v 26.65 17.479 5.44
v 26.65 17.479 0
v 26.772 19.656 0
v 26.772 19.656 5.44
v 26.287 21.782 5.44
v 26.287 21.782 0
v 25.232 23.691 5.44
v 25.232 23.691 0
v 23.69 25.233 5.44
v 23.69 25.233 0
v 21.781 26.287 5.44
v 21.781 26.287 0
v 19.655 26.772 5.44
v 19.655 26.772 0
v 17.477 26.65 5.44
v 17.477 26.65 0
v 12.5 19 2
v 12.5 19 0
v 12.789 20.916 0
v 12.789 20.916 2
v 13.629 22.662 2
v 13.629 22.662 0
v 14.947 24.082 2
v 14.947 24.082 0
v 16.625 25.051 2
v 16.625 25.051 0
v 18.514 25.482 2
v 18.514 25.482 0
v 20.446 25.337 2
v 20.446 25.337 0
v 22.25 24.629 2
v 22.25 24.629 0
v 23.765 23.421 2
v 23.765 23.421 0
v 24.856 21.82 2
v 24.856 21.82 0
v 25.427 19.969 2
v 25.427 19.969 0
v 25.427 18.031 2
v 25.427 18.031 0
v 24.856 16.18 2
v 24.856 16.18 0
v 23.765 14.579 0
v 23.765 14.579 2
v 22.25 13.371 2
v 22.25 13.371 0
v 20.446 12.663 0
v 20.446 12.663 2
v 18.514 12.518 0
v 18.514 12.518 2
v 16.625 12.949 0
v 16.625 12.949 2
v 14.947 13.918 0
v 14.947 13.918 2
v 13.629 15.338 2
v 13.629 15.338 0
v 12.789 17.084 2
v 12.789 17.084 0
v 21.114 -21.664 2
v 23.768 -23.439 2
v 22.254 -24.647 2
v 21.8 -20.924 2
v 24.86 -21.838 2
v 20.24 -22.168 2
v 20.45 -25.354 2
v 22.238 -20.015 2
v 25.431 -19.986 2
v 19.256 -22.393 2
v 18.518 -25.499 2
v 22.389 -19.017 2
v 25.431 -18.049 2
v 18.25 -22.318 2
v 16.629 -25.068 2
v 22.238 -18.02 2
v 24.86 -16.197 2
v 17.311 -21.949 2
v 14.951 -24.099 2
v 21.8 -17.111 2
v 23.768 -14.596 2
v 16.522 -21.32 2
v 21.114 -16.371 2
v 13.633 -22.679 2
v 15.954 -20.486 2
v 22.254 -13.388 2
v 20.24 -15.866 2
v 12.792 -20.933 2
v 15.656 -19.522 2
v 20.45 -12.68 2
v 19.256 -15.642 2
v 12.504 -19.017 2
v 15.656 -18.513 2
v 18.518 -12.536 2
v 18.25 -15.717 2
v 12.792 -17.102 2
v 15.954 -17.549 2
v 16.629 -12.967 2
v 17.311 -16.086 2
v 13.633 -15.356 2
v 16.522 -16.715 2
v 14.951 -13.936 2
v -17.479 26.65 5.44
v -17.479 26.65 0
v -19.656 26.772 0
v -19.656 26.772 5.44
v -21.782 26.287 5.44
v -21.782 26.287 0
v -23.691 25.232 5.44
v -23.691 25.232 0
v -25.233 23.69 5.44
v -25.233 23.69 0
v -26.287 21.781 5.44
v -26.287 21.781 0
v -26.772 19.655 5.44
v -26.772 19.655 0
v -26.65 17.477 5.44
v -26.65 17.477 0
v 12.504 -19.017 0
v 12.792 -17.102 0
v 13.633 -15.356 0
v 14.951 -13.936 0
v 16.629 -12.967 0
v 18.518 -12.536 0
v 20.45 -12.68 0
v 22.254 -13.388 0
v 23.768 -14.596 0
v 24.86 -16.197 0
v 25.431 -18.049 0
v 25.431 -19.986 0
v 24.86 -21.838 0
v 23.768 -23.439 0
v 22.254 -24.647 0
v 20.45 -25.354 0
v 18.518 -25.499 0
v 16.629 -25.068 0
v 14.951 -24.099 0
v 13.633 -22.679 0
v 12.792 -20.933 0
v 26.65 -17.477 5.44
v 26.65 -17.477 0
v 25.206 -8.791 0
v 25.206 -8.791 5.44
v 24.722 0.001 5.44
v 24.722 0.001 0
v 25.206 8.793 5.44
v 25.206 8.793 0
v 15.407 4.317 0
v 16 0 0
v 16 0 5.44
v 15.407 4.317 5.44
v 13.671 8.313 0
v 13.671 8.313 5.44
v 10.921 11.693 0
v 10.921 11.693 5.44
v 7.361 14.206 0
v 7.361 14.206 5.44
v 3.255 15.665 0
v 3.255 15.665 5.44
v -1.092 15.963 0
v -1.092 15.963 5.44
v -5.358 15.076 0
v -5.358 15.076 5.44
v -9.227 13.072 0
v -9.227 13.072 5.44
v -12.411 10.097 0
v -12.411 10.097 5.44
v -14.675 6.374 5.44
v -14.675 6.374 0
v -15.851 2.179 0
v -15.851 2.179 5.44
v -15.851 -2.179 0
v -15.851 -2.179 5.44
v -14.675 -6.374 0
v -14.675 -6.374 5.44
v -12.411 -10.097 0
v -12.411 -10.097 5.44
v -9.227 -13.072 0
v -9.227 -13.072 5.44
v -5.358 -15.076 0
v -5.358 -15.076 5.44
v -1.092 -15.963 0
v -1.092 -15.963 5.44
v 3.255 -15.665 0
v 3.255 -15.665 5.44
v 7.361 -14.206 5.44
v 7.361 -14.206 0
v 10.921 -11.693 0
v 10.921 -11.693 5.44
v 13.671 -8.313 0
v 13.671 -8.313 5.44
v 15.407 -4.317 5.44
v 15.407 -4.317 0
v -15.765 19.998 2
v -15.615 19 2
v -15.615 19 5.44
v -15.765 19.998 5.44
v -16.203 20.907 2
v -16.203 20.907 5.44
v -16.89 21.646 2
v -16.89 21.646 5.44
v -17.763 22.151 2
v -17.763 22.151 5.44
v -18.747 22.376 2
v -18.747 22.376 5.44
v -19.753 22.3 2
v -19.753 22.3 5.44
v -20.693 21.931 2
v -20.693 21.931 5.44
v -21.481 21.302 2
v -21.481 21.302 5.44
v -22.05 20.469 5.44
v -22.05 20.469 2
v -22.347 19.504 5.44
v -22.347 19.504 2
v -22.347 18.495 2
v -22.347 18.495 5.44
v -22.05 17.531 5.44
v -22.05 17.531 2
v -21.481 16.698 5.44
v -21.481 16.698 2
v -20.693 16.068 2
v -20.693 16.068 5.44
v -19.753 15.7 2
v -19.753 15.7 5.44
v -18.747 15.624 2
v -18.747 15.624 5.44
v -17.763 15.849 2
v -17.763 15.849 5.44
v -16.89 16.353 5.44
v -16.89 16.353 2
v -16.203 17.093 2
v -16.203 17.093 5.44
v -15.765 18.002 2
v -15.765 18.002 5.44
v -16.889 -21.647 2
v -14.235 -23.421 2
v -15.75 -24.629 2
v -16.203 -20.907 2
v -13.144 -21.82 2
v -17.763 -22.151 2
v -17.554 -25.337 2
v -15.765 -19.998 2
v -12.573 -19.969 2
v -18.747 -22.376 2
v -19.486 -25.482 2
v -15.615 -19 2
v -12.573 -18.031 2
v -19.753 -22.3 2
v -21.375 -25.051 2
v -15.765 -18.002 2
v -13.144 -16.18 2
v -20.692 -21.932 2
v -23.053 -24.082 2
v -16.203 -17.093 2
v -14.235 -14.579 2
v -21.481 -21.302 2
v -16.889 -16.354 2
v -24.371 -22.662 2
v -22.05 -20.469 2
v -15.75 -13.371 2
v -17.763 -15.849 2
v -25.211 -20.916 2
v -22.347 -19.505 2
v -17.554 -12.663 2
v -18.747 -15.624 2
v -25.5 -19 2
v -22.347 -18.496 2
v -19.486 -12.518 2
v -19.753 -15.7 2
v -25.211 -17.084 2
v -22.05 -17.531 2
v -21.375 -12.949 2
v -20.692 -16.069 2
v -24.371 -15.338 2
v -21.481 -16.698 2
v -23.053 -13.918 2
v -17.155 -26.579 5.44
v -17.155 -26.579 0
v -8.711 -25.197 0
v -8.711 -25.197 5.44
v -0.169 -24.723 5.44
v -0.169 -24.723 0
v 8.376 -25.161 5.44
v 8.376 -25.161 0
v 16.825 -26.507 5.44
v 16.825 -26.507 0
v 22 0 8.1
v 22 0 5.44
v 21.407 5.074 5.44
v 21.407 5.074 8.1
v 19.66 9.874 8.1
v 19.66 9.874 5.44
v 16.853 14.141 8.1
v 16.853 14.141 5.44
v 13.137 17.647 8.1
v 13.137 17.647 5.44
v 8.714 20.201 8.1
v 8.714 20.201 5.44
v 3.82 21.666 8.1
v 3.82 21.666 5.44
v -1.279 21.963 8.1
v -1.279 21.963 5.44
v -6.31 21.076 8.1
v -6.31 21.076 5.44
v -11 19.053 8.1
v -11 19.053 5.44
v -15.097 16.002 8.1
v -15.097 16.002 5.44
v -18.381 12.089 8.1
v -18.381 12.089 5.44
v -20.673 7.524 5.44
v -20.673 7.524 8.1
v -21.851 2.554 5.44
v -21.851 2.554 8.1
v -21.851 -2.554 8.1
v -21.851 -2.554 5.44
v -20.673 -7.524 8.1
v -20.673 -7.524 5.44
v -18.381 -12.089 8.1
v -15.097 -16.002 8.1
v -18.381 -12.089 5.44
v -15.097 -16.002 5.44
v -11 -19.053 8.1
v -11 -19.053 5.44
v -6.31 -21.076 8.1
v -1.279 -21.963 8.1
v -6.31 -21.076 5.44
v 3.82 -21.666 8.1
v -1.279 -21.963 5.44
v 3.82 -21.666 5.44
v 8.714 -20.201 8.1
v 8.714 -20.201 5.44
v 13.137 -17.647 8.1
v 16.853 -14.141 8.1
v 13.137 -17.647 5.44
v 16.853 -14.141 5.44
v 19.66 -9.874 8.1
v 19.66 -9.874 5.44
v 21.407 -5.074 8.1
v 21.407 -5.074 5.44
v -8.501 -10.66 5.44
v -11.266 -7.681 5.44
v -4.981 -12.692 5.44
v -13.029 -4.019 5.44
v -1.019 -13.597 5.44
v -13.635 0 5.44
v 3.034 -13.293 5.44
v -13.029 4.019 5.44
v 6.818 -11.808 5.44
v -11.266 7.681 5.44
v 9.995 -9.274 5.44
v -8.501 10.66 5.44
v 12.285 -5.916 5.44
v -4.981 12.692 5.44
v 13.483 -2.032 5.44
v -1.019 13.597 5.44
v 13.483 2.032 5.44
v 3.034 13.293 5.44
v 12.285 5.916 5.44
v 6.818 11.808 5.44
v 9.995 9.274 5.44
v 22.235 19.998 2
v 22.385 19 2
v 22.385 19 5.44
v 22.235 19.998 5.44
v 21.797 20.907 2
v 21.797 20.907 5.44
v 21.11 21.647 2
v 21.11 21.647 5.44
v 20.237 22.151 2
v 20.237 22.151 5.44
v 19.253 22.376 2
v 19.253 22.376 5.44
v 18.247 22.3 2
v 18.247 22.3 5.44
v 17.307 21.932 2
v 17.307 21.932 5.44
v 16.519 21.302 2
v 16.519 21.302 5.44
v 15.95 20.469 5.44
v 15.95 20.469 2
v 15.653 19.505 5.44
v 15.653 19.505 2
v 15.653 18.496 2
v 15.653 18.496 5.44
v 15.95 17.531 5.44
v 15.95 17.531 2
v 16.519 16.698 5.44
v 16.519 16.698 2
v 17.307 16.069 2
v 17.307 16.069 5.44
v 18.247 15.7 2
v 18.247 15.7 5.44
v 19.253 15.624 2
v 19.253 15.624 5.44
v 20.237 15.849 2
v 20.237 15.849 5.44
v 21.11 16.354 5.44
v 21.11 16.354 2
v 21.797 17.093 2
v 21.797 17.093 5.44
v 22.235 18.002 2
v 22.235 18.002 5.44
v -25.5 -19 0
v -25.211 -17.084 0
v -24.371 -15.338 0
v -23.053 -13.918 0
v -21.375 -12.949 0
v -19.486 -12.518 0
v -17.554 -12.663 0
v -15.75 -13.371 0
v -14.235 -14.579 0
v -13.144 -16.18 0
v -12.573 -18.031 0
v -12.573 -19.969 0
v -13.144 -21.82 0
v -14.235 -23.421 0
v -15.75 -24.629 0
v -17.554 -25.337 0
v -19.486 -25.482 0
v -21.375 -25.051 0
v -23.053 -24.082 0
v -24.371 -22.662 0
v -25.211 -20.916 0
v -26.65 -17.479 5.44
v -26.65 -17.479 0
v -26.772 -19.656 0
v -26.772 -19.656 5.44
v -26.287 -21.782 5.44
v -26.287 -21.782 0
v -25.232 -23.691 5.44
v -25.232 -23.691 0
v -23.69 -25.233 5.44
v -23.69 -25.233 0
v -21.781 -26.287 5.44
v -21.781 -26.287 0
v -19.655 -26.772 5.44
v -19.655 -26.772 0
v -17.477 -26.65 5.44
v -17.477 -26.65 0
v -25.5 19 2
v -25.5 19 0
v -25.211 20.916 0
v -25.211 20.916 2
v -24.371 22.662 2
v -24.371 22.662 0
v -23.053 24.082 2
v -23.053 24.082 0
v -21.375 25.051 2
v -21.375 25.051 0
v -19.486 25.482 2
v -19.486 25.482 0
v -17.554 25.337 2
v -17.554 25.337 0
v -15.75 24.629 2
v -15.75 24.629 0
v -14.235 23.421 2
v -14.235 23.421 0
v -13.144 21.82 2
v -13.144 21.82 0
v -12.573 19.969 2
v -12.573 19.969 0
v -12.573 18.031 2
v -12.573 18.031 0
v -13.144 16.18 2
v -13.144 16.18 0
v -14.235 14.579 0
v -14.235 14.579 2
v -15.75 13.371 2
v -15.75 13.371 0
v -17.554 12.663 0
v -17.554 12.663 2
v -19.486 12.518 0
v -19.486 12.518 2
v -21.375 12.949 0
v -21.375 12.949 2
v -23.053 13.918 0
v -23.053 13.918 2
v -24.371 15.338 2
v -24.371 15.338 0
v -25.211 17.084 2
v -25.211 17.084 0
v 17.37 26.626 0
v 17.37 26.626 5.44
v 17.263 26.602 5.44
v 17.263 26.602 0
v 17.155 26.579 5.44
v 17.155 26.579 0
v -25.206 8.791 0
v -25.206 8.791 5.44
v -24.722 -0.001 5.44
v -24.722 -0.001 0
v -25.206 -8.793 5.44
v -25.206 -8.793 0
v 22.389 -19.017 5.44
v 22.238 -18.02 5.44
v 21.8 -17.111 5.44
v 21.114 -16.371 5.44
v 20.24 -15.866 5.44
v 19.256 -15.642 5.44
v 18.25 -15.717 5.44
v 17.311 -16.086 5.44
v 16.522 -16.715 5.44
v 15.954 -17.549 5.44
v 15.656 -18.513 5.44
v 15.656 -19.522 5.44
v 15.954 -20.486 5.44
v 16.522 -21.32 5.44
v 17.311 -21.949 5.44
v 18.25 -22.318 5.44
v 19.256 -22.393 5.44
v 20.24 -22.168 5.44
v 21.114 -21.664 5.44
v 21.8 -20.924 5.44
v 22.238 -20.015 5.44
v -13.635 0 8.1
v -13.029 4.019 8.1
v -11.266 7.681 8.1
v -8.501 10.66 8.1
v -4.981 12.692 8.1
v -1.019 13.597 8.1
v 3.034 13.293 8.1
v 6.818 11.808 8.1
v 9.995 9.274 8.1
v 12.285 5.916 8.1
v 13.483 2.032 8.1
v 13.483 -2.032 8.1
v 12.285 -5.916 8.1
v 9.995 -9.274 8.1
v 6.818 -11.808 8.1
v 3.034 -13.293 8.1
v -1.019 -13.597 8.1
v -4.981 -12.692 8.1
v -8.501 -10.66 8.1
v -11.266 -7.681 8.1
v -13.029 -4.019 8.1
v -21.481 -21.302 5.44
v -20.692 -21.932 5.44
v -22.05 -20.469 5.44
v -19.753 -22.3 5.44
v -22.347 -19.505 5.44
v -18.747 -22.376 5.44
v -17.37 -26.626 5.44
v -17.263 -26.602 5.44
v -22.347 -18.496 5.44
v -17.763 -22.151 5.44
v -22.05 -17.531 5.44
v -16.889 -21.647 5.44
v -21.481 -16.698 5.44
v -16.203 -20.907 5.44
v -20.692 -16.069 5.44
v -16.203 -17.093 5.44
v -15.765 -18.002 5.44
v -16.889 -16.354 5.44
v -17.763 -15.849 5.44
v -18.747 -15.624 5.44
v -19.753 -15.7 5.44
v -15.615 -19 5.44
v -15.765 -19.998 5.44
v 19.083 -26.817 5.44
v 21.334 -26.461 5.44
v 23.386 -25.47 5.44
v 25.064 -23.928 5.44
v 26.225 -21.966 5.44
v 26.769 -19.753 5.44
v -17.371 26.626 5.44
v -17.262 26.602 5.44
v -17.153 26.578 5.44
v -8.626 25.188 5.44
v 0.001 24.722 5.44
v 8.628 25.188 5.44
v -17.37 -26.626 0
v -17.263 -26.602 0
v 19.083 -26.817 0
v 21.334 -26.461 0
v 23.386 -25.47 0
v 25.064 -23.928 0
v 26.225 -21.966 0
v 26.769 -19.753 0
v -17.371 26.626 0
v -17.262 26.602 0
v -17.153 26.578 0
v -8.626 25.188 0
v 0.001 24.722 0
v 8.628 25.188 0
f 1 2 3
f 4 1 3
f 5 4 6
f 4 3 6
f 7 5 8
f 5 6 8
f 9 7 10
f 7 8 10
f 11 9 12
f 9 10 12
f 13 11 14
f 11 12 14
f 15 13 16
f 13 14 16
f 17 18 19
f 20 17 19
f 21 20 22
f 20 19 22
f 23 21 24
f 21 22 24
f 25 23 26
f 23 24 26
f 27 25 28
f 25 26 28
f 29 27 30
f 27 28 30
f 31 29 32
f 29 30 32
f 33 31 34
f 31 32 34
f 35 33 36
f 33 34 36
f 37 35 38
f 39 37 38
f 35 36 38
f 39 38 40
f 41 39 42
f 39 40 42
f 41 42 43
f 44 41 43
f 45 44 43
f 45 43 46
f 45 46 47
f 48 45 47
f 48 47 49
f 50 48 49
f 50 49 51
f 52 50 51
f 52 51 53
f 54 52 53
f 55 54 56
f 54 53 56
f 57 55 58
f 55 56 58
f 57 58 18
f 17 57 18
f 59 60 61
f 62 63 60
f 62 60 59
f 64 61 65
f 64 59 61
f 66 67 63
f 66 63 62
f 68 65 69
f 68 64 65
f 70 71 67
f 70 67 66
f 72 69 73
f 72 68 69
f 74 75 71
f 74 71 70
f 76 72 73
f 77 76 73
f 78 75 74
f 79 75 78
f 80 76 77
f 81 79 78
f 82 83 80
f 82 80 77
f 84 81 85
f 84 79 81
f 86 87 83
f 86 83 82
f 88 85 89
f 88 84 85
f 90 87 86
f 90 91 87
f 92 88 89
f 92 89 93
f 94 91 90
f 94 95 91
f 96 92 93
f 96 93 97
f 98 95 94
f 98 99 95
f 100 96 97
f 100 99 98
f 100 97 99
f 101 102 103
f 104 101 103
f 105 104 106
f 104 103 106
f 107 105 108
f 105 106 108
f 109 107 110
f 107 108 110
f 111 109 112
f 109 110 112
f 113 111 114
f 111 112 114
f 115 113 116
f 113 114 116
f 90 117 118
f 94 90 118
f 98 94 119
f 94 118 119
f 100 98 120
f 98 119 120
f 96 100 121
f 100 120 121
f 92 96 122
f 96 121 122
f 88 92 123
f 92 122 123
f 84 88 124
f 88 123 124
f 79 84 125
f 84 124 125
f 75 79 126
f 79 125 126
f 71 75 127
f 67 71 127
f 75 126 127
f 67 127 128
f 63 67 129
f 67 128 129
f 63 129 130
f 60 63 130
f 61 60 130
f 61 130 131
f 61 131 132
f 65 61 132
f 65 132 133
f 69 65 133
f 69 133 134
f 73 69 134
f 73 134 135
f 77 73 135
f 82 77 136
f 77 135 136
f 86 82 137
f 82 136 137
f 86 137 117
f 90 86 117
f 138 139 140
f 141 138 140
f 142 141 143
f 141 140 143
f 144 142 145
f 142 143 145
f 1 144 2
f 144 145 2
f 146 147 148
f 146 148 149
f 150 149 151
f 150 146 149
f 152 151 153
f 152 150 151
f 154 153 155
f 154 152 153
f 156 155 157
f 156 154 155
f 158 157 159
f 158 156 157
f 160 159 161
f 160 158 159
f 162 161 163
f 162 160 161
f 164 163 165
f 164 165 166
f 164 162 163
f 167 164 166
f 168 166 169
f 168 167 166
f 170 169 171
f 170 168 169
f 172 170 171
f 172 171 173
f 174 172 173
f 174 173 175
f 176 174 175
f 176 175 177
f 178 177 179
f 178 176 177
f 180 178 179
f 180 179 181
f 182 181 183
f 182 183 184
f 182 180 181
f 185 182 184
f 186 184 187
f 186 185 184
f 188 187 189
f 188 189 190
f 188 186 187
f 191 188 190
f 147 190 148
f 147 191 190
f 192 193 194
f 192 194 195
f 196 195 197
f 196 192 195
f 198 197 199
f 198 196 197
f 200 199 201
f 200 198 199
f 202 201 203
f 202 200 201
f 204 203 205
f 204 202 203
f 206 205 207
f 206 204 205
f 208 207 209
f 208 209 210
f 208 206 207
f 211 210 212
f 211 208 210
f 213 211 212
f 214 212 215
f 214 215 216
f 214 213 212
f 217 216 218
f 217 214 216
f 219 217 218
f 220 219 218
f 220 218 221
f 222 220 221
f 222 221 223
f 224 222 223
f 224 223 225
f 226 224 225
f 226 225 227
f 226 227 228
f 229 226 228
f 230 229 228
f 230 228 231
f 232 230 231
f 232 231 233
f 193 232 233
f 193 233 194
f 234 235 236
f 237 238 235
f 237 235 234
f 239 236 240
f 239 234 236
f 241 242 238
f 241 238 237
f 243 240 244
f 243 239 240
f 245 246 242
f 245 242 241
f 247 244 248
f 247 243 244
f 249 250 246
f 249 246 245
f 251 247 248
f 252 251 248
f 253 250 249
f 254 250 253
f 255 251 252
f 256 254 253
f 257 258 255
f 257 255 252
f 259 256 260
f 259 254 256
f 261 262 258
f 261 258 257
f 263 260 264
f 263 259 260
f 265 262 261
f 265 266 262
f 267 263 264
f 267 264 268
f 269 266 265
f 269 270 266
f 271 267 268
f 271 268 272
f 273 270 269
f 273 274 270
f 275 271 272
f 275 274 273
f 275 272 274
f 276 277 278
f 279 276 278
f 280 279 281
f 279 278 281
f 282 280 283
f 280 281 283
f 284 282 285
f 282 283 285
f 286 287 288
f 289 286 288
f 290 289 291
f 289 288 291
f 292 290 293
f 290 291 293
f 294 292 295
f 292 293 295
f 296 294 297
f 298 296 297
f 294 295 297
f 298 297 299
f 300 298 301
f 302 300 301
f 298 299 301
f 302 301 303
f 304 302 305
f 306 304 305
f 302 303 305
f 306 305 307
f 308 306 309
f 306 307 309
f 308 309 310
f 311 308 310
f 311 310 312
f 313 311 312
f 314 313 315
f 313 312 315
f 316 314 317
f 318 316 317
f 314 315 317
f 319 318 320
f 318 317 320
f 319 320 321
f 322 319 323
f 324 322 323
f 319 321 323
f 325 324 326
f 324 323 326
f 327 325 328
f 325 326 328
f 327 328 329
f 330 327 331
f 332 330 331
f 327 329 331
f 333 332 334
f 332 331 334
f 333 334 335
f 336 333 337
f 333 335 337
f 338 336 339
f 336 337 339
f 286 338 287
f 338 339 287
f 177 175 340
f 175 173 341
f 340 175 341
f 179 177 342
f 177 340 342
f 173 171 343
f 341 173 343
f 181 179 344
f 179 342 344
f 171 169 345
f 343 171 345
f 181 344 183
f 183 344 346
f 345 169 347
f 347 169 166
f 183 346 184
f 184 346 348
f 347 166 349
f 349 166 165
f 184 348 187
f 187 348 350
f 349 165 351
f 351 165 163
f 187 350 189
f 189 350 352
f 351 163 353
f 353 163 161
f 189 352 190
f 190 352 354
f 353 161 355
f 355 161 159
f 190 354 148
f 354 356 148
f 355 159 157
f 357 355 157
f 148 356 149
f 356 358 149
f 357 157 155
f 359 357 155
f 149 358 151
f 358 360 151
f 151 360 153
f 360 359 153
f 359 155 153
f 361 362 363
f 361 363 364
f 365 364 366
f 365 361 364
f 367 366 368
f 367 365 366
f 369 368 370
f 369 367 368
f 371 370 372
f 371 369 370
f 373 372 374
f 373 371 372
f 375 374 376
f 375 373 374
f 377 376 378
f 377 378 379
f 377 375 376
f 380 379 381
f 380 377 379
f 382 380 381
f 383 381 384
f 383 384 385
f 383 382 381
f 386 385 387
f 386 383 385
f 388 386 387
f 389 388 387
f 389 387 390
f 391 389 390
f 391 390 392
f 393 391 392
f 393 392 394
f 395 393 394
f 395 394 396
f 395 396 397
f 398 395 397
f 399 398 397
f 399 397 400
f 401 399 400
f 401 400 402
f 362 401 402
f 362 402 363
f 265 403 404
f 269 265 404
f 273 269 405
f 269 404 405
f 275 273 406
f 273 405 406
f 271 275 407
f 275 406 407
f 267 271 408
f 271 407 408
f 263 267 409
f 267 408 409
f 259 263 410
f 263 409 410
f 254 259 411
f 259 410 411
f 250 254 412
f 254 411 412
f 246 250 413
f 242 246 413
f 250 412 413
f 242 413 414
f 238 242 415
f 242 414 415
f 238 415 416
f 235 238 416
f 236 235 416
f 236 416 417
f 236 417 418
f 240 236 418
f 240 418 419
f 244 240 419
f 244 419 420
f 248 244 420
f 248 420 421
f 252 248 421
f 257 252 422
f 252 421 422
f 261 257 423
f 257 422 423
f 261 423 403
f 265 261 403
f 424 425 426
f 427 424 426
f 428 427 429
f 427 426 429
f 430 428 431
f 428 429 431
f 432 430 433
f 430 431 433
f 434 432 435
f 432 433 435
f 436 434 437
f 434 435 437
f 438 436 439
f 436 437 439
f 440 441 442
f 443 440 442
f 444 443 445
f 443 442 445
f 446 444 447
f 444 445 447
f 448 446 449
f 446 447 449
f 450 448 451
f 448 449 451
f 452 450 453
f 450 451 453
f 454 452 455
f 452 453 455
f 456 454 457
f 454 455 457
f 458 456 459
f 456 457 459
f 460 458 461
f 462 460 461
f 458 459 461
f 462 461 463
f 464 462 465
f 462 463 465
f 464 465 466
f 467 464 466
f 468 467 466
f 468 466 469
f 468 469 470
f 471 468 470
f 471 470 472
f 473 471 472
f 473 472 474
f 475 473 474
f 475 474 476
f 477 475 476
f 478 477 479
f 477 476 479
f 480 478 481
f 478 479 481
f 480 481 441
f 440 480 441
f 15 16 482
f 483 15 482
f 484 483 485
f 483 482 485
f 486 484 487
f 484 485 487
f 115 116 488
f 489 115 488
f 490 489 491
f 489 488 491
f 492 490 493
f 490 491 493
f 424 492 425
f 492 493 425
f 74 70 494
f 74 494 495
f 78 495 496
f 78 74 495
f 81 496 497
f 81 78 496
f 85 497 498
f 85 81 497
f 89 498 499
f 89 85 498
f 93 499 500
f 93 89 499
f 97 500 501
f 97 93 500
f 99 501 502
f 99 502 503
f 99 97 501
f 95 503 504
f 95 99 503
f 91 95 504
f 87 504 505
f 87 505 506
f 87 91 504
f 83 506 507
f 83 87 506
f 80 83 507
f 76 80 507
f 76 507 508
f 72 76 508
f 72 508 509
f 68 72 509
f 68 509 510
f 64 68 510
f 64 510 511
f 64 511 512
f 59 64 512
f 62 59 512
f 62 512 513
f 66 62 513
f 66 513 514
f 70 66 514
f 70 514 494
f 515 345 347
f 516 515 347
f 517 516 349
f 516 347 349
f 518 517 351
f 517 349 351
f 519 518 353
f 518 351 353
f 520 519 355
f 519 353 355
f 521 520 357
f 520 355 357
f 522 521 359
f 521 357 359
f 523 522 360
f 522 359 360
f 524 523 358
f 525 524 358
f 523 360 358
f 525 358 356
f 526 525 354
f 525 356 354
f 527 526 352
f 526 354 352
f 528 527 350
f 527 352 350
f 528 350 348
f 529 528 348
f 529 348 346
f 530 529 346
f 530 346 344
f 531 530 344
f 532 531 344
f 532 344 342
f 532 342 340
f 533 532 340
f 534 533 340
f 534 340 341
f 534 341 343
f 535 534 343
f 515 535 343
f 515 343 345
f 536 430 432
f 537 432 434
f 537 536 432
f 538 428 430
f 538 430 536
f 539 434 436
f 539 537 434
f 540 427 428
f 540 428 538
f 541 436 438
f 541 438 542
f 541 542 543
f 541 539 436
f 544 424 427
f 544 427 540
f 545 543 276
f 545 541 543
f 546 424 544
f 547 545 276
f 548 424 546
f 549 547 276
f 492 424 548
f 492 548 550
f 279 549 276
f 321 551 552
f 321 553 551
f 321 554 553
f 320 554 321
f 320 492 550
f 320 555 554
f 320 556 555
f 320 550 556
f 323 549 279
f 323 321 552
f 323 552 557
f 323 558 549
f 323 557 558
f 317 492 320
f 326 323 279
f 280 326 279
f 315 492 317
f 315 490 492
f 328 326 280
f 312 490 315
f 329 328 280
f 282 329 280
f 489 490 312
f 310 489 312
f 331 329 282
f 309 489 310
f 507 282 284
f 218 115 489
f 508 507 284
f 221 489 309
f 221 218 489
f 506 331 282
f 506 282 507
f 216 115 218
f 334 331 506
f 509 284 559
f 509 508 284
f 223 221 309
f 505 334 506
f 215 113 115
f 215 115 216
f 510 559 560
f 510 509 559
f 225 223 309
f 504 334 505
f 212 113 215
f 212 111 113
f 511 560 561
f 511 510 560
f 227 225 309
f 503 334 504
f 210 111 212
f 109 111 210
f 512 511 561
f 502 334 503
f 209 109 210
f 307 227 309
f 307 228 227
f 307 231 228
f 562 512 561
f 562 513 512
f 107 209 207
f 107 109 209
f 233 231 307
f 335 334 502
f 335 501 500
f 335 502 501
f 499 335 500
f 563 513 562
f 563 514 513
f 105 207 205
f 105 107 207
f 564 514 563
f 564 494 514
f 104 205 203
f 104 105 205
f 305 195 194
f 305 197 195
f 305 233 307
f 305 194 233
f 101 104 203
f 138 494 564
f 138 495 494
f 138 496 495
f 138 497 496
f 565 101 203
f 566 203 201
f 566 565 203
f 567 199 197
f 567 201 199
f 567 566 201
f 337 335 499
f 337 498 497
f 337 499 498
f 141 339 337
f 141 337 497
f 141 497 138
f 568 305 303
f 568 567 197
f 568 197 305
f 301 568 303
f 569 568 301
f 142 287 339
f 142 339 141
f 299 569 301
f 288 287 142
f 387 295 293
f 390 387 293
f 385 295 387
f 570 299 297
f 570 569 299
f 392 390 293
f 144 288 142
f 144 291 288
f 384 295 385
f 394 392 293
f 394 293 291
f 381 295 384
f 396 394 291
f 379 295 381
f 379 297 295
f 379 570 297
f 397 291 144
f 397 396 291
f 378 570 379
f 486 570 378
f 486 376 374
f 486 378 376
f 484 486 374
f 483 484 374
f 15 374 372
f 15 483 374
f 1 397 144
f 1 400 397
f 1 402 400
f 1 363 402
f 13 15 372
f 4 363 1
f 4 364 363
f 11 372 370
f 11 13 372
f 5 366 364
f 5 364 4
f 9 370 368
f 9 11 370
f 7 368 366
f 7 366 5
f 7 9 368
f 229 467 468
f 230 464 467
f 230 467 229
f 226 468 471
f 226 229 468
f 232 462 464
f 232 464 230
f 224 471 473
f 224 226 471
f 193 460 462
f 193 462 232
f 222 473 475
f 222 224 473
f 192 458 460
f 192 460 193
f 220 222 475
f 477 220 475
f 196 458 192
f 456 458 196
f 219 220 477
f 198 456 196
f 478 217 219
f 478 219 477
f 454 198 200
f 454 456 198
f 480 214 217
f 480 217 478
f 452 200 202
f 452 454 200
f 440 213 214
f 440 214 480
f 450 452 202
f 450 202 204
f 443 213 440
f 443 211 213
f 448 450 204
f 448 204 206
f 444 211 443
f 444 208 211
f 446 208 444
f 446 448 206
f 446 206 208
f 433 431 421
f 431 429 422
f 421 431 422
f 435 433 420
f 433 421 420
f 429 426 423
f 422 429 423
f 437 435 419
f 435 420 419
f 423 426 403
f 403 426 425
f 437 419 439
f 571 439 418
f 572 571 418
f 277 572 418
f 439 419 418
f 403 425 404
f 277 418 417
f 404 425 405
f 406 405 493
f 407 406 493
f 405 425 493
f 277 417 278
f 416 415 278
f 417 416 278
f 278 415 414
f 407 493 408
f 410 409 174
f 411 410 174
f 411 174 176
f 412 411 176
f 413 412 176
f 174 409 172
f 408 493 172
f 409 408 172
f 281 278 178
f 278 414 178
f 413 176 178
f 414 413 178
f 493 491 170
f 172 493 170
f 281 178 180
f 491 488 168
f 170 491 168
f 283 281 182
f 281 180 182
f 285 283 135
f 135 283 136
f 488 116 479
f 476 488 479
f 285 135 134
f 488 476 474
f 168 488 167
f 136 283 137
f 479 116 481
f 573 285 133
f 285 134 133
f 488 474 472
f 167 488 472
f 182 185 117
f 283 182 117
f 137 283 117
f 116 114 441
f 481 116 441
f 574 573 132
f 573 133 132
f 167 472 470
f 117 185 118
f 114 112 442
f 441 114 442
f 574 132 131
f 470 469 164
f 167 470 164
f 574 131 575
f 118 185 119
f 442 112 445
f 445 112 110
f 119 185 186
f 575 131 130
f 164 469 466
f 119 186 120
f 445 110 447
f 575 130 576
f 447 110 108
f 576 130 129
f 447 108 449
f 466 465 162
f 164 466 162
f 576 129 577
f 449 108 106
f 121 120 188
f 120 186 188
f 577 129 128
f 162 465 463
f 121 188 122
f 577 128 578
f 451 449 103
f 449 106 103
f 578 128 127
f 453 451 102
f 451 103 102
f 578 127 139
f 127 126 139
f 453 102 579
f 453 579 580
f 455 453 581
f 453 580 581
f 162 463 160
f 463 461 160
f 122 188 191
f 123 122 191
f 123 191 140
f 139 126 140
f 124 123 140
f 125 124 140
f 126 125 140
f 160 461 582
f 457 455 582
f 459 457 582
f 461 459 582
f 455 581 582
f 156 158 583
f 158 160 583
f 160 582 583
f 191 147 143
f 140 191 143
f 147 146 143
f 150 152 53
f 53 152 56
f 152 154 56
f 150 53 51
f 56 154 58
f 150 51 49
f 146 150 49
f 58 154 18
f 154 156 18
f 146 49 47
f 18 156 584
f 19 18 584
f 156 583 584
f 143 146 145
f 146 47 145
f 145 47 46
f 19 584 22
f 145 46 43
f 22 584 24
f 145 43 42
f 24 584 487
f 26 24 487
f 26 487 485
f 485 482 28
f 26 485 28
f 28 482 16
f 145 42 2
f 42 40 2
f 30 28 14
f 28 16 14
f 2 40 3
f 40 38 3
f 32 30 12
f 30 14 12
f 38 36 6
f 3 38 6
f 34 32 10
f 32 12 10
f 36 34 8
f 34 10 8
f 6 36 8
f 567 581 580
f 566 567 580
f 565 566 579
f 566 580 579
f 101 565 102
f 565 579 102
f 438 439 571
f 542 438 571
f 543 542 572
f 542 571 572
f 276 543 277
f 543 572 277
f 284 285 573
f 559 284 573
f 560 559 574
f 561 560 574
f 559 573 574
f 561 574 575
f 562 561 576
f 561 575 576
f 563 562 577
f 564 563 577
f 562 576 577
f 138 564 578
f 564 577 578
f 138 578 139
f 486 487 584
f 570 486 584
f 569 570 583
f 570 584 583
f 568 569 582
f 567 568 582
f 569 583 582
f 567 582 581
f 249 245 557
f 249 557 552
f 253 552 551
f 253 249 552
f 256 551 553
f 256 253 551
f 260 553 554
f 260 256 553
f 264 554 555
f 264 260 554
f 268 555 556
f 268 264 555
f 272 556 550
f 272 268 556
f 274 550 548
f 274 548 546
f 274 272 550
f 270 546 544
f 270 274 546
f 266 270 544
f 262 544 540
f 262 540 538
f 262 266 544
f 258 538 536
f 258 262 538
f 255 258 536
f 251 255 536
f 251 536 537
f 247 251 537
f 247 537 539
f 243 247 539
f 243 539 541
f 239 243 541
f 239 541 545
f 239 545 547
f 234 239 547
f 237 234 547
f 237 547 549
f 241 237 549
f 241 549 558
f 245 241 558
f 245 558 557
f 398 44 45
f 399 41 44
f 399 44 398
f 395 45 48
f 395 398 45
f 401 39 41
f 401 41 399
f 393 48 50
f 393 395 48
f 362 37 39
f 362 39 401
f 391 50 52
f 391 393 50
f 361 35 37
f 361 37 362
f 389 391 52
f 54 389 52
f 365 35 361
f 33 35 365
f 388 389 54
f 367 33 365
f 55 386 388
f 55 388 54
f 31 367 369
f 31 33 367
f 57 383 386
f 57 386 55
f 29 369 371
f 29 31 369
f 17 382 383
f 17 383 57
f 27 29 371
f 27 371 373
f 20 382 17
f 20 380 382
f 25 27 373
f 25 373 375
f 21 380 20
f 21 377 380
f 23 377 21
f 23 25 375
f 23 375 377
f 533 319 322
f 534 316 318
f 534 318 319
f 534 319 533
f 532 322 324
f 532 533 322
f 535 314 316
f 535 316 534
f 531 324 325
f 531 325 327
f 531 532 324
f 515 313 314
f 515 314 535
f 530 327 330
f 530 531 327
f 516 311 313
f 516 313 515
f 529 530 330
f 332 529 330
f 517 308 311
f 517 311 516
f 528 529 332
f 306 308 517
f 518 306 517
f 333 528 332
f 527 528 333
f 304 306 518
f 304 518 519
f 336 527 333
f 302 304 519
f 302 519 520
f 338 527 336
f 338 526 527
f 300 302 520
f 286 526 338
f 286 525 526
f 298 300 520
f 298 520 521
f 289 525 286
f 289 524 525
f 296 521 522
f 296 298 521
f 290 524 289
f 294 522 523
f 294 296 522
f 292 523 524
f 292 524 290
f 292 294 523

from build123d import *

# Parameters (mm, degrees)
SKETCH1_R           = 3.385
SKETCH1_R_2         = 16
BOSS_EXTRUDE1_DEPTH = 5.44
SKETCH2_R           = 6.5
CUT_EXTRUDE1_DEPTH  = 2
SKETCH3_R           = 22
BOSS_EXTRUDE2_DEPTH = 2.66
SKETCH4_R           = 13.635
CUT_EXTRUDE2_DEPTH  = 3.66


with BuildPart() as part:
    # Sketch1 → Boss-Extrude1 (new body)
    with BuildSketch(Plane.XY):
        with BuildLine():
            ThreePointArc((-17.15500238, -26.5786804), (-0.168836143, -24.722579211), (16.825003911, -26.507055409))
            ThreePointArc((16.825003911, -26.507055409), (24.281605458, -24.760439823), (26.649977107, -17.477419272))
            ThreePointArc((26.649977107, -17.477419272), (24.722401047, 0.0008954), (26.650274279, 17.479177295))
            ThreePointArc((26.650274279, 17.479177295), (24.514793015, 24.516072703), (17.477419272, 26.649977107))
            ThreePointArc((17.477419272, 26.649977107), (17.316247519, 26.614162818), (17.15500238, 26.5786804))
            ThreePointArc((17.15500238, 26.5786804), (0.000817995, 24.722401051), (-17.153414138, 26.578239095))
            ThreePointArc((-17.153414138, 26.578239095), (-17.316333175, 26.61408729), (-17.479177295, 26.650274279))
            ThreePointArc((-17.479177295, 26.650274279), (-24.516072703, 24.514793015), (-26.649977107, 17.477419272))
            ThreePointArc((-26.649977107, 17.477419272), (-24.722401047, -0.0008954), (-26.650274279, -17.479177295))
            ThreePointArc((-26.650274279, -17.479177295), (-24.514793015, -24.516072703), (-17.477419272, -26.649977107))
            ThreePointArc((-17.477419272, -26.649977107), (-17.316247519, -26.614162818), (-17.15500238, -26.5786804))
        make_face()
        with Locations((-18.999978097, -19.000021903)):
            Circle(SKETCH1_R, mode=Mode.SUBTRACT)
        with Locations((19.003521801, -19.017458637)):
            Circle(SKETCH1_R, mode=Mode.SUBTRACT)
        Circle(SKETCH1_R_2, mode=Mode.SUBTRACT)
        with Locations((-19.000021903, 18.999978097)):
            Circle(SKETCH1_R, mode=Mode.SUBTRACT)
        with Locations((18.999978097, 19.000021903)):
            Circle(SKETCH1_R, mode=Mode.SUBTRACT)
    extrude(amount=BOSS_EXTRUDE1_DEPTH)

    # Sketch2 → Cut-Extrude1 (cut)
    with BuildSketch(Plane(origin=(0, 0, 0), x_dir=(-1, 0, 0), z_dir=(0, 0, -1))):
        with Locations((19.000021903, 18.999978097)):
            Circle(SKETCH2_R)
        with Locations((-18.999978097, 19.000021903)):
            Circle(SKETCH2_R)
        with Locations((-19.003521801, -19.017458637)):
            Circle(SKETCH2_R)
        with Locations((18.999978097, -19.000021903)):
            Circle(SKETCH2_R)
    extrude(amount=-CUT_EXTRUDE1_DEPTH, mode=Mode.SUBTRACT)

    # Sketch3 → Boss-Extrude2 (add)
    with BuildSketch(Plane.XY.offset(5.44)):
        Circle(SKETCH3_R)
    extrude(amount=BOSS_EXTRUDE2_DEPTH)

    # Sketch4 → Cut-Extrude2 (cut, through all)
    with BuildSketch(Plane(origin=(0, 0, 5.44), x_dir=(-1, 0, 0), z_dir=(0, 0, -1))):
        Circle(SKETCH4_R)
    extrude(amount=-CUT_EXTRUDE2_DEPTH, mode=Mode.SUBTRACT)


solid = part.part
